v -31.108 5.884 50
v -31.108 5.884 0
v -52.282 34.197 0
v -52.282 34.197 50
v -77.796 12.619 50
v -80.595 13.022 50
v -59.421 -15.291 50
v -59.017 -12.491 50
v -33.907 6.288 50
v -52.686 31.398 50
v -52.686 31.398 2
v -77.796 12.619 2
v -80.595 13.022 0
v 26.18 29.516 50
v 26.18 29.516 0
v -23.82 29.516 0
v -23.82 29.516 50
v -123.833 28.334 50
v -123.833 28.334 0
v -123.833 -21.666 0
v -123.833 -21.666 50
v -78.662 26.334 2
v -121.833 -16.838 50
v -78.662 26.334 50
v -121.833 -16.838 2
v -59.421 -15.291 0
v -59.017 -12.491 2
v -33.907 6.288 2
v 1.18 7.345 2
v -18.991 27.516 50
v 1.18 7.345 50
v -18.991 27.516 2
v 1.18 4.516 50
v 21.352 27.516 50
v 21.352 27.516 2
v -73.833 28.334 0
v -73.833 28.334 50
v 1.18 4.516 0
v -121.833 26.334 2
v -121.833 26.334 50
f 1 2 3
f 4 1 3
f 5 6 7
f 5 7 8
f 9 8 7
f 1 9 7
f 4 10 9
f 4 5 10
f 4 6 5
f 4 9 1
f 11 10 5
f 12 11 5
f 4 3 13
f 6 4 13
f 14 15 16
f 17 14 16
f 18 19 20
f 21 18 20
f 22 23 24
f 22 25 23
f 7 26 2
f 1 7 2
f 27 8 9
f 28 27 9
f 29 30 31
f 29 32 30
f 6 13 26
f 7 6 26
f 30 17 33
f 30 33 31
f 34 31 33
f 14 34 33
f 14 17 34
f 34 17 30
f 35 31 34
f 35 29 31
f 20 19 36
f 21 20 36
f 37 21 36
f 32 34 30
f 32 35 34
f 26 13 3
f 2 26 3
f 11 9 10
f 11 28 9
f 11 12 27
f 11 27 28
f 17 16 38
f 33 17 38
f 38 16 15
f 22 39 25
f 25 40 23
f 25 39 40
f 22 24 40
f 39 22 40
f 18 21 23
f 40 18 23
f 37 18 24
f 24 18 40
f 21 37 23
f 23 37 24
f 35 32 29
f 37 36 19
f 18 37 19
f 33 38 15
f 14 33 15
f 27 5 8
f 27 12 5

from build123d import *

# Parameters (mm, degrees)
F1_DEPTH = 50
F2_T     = -2
F2_2_T   = -2
F2_3_T   = -2


# Not quite as in the source:
# - a feature names something its author has since deleted; it is built from what else it names


with BuildPart() as f1:
    # F0 (on Top) → F1 (new body)
    with BuildSketch(Plane.XY):
        Polygon((-73.8333829338, 28.3337179901), (-123.8333829338, 28.3337179901), (-123.8333829338, -21.6662820099), align=None)
    extrude(amount=F1_DEPTH)

    # F2#3
    f2_3_openings = [f1.faces().sort_by_distance(p)[0] for p in [
        (-107.166716, 11.667051, 50),
    ]]
    offset(amount=F2_3_T, openings=f2_3_openings)


with BuildPart() as f1b:
    # F0 (on Top) → F1, piece 2 (new body)
    with BuildSketch(Plane.XY):
        Polygon((-31.1075429039, 5.8839563866), (-52.2822653136, 34.1970475437), (-80.5953564708, 13.0223251341), (-59.4206340611, -15.2907660231), align=None)
    extrude(amount=F1_DEPTH)

    # F2#2
    f2_2_openings = [f1b.faces().sort_by_distance(p)[0] for p in [
        (-55.85145, 9.453141, 50),
    ]]
    offset(amount=F2_2_T, openings=f2_2_openings)


with BuildPart() as f1c:
    # F0 (on Top) → F1, piece 3 (new body)
    with BuildSketch(Plane.XY):
        Polygon((26.1802889407, 29.5160934329), (-23.8197110593, 29.5160934329), (1.1802889407, 4.5160934329), align=None)
    extrude(amount=F1_DEPTH)

    # F2
    f2_openings = [f1c.faces().sort_by_distance(p)[0] for p in [
        (1.180289, 21.18276, 50),
    ]]
    offset(amount=F2_T, openings=f2_openings)


solid = Compound([f1.part, f1b.part, f1c.part])
